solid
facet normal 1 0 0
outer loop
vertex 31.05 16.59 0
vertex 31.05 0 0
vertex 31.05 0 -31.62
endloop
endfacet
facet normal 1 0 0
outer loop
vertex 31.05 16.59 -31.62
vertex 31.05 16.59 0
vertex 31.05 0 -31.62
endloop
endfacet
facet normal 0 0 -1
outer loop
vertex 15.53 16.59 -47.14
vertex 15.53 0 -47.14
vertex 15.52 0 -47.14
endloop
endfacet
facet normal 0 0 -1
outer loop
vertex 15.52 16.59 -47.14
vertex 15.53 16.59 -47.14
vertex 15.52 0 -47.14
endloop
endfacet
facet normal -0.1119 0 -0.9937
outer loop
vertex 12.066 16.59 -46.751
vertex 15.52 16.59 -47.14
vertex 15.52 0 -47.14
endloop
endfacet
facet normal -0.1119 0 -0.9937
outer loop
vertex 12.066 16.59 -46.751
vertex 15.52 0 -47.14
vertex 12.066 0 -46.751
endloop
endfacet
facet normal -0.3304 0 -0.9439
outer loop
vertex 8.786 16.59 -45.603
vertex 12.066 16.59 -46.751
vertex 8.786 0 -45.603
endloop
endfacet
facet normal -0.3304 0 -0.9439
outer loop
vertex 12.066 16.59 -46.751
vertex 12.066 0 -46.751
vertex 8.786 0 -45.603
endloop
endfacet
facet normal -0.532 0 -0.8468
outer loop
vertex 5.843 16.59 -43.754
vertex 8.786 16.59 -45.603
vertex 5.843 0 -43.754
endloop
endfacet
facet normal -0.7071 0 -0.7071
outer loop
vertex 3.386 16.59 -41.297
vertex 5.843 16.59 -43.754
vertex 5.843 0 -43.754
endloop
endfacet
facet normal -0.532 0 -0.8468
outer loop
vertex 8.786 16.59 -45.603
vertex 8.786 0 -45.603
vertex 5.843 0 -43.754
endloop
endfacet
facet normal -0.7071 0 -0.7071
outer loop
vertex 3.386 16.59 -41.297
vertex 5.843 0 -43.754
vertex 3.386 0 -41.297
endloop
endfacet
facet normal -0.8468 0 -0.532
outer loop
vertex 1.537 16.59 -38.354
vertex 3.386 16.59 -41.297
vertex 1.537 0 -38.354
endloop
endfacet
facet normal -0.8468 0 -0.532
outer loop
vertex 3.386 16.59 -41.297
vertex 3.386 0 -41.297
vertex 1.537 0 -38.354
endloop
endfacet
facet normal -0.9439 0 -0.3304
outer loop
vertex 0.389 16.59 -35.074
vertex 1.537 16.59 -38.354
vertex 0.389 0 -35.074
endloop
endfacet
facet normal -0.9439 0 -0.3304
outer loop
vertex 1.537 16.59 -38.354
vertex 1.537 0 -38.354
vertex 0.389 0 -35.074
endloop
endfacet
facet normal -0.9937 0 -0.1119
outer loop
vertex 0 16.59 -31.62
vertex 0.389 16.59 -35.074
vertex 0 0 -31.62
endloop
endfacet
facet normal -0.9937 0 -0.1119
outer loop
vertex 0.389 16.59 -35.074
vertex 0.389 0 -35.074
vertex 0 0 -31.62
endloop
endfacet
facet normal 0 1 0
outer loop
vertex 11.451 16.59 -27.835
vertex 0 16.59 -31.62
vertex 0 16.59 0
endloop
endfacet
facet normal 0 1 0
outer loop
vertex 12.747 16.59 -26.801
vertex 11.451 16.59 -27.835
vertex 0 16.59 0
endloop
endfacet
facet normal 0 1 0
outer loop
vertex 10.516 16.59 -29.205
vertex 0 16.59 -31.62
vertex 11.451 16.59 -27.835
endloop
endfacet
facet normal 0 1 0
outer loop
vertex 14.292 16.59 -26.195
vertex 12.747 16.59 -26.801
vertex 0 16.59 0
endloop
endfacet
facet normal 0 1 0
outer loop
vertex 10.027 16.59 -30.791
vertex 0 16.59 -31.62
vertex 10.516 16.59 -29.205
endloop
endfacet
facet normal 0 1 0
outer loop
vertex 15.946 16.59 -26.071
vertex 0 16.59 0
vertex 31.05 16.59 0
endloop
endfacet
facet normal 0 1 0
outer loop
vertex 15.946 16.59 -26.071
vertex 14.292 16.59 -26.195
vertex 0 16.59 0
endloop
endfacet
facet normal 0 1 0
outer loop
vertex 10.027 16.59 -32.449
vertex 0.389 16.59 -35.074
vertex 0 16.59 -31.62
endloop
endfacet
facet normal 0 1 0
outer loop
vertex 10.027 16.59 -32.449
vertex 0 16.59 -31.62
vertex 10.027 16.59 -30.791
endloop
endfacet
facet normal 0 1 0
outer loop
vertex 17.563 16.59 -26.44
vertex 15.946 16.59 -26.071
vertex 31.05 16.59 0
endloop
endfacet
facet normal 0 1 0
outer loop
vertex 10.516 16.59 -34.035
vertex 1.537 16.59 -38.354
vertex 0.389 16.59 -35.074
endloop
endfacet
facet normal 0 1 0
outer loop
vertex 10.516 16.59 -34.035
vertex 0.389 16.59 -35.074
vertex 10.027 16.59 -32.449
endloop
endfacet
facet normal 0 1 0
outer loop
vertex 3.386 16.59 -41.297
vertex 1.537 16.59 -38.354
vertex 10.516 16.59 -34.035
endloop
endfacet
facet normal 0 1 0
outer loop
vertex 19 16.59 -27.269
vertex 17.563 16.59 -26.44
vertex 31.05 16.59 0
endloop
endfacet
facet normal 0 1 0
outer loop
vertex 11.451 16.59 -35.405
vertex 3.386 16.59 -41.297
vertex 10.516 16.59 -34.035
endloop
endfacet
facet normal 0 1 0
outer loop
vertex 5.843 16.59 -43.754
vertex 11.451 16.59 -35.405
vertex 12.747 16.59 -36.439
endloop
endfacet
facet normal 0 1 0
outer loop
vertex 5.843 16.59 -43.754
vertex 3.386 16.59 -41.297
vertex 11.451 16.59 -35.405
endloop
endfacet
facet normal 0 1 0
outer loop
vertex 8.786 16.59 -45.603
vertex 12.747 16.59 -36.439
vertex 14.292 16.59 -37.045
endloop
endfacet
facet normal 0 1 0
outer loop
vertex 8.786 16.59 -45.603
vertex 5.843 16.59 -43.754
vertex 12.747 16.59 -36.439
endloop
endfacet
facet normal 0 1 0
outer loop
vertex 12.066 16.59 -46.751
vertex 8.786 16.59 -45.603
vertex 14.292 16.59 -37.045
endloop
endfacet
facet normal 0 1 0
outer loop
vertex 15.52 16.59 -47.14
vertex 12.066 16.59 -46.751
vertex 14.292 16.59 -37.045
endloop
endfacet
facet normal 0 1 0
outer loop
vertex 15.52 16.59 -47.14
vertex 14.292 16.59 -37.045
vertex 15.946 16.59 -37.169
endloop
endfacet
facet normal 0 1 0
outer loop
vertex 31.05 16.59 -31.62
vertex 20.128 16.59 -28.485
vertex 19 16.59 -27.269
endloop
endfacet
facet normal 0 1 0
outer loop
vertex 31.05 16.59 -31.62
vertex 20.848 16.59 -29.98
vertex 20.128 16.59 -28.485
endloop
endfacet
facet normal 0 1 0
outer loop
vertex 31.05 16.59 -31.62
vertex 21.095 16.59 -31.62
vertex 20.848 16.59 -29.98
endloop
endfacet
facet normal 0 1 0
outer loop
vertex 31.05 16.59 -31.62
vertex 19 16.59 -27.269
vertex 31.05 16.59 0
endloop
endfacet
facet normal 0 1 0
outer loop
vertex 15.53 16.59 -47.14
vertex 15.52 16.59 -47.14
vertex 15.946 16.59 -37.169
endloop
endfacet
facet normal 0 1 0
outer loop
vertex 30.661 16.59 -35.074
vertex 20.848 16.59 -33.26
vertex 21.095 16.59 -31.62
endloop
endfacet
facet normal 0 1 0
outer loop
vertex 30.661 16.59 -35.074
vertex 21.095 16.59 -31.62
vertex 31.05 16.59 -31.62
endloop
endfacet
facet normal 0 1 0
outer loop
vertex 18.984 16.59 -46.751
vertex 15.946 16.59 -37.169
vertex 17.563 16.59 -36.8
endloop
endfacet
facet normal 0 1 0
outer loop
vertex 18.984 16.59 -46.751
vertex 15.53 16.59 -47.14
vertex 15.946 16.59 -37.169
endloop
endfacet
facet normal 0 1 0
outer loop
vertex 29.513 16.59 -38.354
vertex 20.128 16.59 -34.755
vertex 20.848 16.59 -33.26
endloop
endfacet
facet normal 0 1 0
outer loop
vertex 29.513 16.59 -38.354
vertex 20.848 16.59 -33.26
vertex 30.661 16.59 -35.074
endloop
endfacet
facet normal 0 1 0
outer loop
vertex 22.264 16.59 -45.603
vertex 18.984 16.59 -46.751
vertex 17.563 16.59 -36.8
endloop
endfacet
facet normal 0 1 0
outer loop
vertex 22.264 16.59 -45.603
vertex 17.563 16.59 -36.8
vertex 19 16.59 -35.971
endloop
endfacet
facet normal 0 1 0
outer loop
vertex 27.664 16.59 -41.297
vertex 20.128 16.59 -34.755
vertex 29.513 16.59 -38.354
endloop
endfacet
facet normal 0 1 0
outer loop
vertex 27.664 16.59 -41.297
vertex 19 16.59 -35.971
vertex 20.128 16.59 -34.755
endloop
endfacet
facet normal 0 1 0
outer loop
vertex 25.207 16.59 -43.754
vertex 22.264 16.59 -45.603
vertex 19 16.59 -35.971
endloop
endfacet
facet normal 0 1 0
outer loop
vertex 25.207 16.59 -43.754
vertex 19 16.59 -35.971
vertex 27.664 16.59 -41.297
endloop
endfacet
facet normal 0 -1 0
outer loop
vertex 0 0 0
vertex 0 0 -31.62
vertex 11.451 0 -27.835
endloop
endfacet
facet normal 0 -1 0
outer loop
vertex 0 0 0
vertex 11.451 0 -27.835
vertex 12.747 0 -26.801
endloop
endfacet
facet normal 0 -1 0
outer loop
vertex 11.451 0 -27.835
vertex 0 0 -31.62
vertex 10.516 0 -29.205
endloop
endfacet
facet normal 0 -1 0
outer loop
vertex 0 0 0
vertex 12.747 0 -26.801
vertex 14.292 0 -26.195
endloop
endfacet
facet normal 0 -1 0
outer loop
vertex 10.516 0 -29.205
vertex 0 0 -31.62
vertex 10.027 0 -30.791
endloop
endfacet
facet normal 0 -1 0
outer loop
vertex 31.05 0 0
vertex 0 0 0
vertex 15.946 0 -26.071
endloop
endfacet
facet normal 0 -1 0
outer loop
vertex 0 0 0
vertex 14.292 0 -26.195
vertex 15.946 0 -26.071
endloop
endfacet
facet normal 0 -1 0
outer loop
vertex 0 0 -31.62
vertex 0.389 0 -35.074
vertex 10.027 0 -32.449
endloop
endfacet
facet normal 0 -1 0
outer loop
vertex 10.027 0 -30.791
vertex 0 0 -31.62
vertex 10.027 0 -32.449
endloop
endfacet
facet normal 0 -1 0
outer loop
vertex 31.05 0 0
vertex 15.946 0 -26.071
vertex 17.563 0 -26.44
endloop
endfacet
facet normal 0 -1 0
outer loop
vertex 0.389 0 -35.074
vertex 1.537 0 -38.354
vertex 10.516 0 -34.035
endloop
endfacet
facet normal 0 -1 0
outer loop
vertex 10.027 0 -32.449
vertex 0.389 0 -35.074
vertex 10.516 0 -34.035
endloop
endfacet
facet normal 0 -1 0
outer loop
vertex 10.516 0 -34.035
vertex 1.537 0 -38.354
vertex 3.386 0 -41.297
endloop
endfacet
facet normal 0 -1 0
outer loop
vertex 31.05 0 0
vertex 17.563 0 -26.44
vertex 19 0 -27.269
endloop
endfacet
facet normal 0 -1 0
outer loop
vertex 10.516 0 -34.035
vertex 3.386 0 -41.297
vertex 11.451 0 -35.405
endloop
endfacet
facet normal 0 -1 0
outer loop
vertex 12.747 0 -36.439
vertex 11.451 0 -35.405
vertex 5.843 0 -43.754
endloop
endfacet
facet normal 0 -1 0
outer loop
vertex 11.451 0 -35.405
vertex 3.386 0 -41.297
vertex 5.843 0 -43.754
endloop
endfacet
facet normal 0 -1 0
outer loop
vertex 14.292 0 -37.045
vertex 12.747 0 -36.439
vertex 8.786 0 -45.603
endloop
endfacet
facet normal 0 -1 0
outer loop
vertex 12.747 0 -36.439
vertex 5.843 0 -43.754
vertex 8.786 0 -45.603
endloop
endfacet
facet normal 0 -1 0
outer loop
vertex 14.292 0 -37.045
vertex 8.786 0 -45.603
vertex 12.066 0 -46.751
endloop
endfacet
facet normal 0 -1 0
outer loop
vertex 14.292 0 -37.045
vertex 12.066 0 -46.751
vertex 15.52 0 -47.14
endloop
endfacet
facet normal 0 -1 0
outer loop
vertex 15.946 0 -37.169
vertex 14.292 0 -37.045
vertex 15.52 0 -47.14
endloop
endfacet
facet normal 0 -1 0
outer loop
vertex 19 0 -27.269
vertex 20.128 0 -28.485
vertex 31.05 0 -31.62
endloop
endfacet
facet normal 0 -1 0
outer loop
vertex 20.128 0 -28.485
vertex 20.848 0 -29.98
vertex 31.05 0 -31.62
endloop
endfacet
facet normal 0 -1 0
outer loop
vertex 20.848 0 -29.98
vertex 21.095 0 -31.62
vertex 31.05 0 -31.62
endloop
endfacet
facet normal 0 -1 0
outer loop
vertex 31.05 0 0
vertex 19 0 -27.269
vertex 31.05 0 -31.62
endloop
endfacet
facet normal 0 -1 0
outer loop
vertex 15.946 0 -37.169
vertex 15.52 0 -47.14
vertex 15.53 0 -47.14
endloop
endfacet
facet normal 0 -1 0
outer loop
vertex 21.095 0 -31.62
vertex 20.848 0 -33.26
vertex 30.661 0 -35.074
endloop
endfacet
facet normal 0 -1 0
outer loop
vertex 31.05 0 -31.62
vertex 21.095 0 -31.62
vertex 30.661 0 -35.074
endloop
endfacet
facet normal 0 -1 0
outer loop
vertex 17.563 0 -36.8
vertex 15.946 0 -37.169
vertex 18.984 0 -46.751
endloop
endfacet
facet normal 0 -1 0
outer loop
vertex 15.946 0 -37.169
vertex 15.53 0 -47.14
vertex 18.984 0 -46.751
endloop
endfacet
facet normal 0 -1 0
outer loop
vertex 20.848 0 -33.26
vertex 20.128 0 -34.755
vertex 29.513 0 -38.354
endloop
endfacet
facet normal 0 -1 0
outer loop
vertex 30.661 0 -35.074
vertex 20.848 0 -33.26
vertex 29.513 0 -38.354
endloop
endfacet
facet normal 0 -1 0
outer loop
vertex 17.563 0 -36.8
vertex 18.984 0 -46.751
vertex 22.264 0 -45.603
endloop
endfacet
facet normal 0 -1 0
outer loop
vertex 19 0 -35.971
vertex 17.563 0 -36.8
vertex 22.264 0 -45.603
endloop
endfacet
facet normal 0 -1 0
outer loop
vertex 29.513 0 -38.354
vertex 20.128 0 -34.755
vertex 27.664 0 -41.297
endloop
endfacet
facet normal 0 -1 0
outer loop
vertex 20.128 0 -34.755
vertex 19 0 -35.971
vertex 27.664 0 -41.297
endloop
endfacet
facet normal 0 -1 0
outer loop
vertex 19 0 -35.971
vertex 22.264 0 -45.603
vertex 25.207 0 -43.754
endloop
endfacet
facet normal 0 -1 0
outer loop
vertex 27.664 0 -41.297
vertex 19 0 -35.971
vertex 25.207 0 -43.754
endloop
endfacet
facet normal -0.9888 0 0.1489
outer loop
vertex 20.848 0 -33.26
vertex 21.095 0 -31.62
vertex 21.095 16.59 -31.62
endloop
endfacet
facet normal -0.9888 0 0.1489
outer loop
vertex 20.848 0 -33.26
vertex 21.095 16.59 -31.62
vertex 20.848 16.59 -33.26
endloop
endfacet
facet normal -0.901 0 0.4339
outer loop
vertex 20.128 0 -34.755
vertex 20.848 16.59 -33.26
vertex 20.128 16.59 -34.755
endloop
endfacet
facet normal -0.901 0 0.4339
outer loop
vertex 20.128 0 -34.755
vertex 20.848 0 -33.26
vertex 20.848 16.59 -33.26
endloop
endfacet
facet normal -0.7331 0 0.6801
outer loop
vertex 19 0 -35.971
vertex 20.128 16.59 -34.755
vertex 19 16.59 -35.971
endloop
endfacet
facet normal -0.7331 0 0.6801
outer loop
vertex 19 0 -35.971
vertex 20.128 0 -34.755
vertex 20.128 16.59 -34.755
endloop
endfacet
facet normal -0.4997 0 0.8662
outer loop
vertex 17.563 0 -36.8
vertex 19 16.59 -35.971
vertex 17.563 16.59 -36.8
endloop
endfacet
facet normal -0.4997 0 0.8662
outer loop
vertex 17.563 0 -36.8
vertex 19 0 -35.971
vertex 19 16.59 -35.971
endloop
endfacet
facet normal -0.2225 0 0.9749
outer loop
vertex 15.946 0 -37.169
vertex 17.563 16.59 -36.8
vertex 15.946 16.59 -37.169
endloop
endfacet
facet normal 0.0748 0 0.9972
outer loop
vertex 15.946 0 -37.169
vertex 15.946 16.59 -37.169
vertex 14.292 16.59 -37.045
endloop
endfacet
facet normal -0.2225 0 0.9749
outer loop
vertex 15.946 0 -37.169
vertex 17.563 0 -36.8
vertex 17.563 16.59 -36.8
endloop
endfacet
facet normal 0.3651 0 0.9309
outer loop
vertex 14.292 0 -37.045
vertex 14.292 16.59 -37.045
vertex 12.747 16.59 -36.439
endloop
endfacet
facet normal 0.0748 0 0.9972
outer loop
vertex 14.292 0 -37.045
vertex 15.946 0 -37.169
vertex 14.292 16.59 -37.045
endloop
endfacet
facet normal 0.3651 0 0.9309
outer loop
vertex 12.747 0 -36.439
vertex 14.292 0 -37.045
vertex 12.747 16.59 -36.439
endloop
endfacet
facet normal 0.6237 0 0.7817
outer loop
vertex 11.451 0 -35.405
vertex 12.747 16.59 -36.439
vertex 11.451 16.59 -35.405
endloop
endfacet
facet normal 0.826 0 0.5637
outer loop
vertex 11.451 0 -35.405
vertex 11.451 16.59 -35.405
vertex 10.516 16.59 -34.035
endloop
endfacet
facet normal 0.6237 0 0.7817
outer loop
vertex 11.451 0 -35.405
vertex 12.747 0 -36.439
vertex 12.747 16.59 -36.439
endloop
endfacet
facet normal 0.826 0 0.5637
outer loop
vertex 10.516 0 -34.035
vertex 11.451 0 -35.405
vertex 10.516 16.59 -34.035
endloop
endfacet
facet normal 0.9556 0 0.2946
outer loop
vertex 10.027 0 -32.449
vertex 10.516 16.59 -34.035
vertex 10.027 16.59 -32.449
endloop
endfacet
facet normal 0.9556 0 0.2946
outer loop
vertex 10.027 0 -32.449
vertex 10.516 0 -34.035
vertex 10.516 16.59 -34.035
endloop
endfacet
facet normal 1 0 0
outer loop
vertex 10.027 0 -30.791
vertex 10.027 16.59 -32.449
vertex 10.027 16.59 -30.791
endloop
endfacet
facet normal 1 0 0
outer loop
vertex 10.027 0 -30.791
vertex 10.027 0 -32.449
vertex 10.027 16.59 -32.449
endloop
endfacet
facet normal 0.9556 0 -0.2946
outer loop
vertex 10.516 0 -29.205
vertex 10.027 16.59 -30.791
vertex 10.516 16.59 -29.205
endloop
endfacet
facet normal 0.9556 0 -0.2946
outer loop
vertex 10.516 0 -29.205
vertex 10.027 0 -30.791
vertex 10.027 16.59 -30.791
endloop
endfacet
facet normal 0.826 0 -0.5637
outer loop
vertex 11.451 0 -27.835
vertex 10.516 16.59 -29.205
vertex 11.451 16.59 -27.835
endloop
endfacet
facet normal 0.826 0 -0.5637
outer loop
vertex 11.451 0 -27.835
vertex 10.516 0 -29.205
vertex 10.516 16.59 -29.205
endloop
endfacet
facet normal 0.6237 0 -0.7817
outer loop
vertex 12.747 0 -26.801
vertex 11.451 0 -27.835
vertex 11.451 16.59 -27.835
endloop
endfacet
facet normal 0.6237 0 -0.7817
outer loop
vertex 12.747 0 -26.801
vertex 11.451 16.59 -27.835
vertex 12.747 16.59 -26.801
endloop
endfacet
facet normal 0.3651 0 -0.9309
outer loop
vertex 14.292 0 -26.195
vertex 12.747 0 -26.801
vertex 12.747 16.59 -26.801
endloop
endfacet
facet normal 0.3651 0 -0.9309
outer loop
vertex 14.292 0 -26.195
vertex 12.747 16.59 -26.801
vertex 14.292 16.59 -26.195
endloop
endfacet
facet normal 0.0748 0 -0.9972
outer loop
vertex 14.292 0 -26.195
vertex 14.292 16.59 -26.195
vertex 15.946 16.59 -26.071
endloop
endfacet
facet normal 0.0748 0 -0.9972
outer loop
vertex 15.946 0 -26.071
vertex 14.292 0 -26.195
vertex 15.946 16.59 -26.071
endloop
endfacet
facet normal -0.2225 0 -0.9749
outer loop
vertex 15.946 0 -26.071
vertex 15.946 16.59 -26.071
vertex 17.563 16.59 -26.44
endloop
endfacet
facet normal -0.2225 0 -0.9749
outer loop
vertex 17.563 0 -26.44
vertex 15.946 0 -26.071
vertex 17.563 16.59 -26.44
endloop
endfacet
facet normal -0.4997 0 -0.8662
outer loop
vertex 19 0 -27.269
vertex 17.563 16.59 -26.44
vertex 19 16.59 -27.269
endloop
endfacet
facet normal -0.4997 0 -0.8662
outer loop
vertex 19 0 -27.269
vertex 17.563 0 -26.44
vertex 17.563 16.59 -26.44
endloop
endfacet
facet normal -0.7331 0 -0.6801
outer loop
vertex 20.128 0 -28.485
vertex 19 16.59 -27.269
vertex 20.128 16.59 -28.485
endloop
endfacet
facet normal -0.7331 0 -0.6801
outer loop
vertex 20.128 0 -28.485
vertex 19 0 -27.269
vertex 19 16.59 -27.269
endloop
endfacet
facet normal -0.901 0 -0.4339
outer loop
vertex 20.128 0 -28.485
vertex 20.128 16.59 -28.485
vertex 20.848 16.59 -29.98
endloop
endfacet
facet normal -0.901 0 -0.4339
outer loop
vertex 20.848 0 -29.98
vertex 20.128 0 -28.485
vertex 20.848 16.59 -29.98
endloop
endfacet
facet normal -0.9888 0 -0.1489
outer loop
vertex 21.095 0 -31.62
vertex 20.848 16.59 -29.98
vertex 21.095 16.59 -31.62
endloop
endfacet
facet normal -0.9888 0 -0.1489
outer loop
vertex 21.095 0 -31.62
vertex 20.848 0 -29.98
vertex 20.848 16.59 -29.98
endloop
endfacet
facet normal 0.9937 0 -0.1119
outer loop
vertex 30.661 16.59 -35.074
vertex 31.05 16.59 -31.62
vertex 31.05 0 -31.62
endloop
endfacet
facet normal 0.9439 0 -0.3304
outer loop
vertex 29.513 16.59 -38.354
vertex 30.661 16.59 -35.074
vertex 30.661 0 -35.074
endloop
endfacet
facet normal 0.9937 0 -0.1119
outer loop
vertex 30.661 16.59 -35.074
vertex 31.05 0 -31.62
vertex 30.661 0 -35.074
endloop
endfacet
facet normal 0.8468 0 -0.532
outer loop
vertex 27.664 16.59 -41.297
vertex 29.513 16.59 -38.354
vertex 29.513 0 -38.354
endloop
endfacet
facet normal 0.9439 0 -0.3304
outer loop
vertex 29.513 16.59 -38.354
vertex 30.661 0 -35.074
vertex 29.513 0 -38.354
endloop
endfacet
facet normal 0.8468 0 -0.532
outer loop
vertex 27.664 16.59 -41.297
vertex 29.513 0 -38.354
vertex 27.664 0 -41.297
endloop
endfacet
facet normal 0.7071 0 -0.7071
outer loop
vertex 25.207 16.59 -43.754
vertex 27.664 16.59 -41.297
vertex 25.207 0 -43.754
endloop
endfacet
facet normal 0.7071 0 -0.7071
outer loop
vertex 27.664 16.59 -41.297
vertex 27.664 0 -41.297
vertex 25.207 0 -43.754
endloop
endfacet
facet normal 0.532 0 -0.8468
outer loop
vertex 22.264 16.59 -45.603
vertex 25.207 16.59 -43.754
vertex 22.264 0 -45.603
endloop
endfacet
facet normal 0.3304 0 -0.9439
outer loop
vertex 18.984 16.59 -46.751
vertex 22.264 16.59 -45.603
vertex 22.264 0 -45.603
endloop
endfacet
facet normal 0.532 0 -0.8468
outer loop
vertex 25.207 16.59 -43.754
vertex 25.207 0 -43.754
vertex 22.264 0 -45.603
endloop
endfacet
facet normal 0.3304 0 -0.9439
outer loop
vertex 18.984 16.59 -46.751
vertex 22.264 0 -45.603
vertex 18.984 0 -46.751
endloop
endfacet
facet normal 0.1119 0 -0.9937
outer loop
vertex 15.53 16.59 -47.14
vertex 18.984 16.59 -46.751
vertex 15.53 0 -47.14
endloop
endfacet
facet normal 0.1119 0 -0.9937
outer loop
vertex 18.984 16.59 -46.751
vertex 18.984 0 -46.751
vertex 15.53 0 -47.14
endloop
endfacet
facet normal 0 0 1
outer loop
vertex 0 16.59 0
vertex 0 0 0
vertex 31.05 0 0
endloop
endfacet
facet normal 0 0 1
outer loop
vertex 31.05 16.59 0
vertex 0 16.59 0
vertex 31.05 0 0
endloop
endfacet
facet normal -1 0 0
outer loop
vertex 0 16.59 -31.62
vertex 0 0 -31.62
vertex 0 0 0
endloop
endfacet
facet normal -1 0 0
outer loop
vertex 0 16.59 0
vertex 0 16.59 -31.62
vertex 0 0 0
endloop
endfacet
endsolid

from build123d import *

# Parameters (mm, degrees)
SKETCH1_R           = 5.565
BOSS_EXTRUDE1_DEPTH = 16.59


with BuildPart() as part:
    # Sketch1 → Boss-Extrude1 (new body)
    with BuildSketch(Plane(origin=(0, 0, 0), x_dir=(1, 0, 0), z_dir=(0, 1, 0))):
        with BuildLine():
            Line((0, 0), (31.05, 0))
            Line((31.05, 0), (31.05, 31.62))
            ThreePointArc((31.05, 31.62), (26.504297244, 42.594297244), (15.53, 47.14))
            Line((15.53, 47.14), (15.52, 47.14))
            ThreePointArc((15.52, 47.14), (4.545702756, 42.594297244), (0, 31.62))
            Line((0, 31.62), (0, 0))
        make_face()
        with Locations((15.53, 31.62)):
            Circle(SKETCH1_R, mode=Mode.SUBTRACT)
    extrude(amount=BOSS_EXTRUDE1_DEPTH)


solid = part.part
